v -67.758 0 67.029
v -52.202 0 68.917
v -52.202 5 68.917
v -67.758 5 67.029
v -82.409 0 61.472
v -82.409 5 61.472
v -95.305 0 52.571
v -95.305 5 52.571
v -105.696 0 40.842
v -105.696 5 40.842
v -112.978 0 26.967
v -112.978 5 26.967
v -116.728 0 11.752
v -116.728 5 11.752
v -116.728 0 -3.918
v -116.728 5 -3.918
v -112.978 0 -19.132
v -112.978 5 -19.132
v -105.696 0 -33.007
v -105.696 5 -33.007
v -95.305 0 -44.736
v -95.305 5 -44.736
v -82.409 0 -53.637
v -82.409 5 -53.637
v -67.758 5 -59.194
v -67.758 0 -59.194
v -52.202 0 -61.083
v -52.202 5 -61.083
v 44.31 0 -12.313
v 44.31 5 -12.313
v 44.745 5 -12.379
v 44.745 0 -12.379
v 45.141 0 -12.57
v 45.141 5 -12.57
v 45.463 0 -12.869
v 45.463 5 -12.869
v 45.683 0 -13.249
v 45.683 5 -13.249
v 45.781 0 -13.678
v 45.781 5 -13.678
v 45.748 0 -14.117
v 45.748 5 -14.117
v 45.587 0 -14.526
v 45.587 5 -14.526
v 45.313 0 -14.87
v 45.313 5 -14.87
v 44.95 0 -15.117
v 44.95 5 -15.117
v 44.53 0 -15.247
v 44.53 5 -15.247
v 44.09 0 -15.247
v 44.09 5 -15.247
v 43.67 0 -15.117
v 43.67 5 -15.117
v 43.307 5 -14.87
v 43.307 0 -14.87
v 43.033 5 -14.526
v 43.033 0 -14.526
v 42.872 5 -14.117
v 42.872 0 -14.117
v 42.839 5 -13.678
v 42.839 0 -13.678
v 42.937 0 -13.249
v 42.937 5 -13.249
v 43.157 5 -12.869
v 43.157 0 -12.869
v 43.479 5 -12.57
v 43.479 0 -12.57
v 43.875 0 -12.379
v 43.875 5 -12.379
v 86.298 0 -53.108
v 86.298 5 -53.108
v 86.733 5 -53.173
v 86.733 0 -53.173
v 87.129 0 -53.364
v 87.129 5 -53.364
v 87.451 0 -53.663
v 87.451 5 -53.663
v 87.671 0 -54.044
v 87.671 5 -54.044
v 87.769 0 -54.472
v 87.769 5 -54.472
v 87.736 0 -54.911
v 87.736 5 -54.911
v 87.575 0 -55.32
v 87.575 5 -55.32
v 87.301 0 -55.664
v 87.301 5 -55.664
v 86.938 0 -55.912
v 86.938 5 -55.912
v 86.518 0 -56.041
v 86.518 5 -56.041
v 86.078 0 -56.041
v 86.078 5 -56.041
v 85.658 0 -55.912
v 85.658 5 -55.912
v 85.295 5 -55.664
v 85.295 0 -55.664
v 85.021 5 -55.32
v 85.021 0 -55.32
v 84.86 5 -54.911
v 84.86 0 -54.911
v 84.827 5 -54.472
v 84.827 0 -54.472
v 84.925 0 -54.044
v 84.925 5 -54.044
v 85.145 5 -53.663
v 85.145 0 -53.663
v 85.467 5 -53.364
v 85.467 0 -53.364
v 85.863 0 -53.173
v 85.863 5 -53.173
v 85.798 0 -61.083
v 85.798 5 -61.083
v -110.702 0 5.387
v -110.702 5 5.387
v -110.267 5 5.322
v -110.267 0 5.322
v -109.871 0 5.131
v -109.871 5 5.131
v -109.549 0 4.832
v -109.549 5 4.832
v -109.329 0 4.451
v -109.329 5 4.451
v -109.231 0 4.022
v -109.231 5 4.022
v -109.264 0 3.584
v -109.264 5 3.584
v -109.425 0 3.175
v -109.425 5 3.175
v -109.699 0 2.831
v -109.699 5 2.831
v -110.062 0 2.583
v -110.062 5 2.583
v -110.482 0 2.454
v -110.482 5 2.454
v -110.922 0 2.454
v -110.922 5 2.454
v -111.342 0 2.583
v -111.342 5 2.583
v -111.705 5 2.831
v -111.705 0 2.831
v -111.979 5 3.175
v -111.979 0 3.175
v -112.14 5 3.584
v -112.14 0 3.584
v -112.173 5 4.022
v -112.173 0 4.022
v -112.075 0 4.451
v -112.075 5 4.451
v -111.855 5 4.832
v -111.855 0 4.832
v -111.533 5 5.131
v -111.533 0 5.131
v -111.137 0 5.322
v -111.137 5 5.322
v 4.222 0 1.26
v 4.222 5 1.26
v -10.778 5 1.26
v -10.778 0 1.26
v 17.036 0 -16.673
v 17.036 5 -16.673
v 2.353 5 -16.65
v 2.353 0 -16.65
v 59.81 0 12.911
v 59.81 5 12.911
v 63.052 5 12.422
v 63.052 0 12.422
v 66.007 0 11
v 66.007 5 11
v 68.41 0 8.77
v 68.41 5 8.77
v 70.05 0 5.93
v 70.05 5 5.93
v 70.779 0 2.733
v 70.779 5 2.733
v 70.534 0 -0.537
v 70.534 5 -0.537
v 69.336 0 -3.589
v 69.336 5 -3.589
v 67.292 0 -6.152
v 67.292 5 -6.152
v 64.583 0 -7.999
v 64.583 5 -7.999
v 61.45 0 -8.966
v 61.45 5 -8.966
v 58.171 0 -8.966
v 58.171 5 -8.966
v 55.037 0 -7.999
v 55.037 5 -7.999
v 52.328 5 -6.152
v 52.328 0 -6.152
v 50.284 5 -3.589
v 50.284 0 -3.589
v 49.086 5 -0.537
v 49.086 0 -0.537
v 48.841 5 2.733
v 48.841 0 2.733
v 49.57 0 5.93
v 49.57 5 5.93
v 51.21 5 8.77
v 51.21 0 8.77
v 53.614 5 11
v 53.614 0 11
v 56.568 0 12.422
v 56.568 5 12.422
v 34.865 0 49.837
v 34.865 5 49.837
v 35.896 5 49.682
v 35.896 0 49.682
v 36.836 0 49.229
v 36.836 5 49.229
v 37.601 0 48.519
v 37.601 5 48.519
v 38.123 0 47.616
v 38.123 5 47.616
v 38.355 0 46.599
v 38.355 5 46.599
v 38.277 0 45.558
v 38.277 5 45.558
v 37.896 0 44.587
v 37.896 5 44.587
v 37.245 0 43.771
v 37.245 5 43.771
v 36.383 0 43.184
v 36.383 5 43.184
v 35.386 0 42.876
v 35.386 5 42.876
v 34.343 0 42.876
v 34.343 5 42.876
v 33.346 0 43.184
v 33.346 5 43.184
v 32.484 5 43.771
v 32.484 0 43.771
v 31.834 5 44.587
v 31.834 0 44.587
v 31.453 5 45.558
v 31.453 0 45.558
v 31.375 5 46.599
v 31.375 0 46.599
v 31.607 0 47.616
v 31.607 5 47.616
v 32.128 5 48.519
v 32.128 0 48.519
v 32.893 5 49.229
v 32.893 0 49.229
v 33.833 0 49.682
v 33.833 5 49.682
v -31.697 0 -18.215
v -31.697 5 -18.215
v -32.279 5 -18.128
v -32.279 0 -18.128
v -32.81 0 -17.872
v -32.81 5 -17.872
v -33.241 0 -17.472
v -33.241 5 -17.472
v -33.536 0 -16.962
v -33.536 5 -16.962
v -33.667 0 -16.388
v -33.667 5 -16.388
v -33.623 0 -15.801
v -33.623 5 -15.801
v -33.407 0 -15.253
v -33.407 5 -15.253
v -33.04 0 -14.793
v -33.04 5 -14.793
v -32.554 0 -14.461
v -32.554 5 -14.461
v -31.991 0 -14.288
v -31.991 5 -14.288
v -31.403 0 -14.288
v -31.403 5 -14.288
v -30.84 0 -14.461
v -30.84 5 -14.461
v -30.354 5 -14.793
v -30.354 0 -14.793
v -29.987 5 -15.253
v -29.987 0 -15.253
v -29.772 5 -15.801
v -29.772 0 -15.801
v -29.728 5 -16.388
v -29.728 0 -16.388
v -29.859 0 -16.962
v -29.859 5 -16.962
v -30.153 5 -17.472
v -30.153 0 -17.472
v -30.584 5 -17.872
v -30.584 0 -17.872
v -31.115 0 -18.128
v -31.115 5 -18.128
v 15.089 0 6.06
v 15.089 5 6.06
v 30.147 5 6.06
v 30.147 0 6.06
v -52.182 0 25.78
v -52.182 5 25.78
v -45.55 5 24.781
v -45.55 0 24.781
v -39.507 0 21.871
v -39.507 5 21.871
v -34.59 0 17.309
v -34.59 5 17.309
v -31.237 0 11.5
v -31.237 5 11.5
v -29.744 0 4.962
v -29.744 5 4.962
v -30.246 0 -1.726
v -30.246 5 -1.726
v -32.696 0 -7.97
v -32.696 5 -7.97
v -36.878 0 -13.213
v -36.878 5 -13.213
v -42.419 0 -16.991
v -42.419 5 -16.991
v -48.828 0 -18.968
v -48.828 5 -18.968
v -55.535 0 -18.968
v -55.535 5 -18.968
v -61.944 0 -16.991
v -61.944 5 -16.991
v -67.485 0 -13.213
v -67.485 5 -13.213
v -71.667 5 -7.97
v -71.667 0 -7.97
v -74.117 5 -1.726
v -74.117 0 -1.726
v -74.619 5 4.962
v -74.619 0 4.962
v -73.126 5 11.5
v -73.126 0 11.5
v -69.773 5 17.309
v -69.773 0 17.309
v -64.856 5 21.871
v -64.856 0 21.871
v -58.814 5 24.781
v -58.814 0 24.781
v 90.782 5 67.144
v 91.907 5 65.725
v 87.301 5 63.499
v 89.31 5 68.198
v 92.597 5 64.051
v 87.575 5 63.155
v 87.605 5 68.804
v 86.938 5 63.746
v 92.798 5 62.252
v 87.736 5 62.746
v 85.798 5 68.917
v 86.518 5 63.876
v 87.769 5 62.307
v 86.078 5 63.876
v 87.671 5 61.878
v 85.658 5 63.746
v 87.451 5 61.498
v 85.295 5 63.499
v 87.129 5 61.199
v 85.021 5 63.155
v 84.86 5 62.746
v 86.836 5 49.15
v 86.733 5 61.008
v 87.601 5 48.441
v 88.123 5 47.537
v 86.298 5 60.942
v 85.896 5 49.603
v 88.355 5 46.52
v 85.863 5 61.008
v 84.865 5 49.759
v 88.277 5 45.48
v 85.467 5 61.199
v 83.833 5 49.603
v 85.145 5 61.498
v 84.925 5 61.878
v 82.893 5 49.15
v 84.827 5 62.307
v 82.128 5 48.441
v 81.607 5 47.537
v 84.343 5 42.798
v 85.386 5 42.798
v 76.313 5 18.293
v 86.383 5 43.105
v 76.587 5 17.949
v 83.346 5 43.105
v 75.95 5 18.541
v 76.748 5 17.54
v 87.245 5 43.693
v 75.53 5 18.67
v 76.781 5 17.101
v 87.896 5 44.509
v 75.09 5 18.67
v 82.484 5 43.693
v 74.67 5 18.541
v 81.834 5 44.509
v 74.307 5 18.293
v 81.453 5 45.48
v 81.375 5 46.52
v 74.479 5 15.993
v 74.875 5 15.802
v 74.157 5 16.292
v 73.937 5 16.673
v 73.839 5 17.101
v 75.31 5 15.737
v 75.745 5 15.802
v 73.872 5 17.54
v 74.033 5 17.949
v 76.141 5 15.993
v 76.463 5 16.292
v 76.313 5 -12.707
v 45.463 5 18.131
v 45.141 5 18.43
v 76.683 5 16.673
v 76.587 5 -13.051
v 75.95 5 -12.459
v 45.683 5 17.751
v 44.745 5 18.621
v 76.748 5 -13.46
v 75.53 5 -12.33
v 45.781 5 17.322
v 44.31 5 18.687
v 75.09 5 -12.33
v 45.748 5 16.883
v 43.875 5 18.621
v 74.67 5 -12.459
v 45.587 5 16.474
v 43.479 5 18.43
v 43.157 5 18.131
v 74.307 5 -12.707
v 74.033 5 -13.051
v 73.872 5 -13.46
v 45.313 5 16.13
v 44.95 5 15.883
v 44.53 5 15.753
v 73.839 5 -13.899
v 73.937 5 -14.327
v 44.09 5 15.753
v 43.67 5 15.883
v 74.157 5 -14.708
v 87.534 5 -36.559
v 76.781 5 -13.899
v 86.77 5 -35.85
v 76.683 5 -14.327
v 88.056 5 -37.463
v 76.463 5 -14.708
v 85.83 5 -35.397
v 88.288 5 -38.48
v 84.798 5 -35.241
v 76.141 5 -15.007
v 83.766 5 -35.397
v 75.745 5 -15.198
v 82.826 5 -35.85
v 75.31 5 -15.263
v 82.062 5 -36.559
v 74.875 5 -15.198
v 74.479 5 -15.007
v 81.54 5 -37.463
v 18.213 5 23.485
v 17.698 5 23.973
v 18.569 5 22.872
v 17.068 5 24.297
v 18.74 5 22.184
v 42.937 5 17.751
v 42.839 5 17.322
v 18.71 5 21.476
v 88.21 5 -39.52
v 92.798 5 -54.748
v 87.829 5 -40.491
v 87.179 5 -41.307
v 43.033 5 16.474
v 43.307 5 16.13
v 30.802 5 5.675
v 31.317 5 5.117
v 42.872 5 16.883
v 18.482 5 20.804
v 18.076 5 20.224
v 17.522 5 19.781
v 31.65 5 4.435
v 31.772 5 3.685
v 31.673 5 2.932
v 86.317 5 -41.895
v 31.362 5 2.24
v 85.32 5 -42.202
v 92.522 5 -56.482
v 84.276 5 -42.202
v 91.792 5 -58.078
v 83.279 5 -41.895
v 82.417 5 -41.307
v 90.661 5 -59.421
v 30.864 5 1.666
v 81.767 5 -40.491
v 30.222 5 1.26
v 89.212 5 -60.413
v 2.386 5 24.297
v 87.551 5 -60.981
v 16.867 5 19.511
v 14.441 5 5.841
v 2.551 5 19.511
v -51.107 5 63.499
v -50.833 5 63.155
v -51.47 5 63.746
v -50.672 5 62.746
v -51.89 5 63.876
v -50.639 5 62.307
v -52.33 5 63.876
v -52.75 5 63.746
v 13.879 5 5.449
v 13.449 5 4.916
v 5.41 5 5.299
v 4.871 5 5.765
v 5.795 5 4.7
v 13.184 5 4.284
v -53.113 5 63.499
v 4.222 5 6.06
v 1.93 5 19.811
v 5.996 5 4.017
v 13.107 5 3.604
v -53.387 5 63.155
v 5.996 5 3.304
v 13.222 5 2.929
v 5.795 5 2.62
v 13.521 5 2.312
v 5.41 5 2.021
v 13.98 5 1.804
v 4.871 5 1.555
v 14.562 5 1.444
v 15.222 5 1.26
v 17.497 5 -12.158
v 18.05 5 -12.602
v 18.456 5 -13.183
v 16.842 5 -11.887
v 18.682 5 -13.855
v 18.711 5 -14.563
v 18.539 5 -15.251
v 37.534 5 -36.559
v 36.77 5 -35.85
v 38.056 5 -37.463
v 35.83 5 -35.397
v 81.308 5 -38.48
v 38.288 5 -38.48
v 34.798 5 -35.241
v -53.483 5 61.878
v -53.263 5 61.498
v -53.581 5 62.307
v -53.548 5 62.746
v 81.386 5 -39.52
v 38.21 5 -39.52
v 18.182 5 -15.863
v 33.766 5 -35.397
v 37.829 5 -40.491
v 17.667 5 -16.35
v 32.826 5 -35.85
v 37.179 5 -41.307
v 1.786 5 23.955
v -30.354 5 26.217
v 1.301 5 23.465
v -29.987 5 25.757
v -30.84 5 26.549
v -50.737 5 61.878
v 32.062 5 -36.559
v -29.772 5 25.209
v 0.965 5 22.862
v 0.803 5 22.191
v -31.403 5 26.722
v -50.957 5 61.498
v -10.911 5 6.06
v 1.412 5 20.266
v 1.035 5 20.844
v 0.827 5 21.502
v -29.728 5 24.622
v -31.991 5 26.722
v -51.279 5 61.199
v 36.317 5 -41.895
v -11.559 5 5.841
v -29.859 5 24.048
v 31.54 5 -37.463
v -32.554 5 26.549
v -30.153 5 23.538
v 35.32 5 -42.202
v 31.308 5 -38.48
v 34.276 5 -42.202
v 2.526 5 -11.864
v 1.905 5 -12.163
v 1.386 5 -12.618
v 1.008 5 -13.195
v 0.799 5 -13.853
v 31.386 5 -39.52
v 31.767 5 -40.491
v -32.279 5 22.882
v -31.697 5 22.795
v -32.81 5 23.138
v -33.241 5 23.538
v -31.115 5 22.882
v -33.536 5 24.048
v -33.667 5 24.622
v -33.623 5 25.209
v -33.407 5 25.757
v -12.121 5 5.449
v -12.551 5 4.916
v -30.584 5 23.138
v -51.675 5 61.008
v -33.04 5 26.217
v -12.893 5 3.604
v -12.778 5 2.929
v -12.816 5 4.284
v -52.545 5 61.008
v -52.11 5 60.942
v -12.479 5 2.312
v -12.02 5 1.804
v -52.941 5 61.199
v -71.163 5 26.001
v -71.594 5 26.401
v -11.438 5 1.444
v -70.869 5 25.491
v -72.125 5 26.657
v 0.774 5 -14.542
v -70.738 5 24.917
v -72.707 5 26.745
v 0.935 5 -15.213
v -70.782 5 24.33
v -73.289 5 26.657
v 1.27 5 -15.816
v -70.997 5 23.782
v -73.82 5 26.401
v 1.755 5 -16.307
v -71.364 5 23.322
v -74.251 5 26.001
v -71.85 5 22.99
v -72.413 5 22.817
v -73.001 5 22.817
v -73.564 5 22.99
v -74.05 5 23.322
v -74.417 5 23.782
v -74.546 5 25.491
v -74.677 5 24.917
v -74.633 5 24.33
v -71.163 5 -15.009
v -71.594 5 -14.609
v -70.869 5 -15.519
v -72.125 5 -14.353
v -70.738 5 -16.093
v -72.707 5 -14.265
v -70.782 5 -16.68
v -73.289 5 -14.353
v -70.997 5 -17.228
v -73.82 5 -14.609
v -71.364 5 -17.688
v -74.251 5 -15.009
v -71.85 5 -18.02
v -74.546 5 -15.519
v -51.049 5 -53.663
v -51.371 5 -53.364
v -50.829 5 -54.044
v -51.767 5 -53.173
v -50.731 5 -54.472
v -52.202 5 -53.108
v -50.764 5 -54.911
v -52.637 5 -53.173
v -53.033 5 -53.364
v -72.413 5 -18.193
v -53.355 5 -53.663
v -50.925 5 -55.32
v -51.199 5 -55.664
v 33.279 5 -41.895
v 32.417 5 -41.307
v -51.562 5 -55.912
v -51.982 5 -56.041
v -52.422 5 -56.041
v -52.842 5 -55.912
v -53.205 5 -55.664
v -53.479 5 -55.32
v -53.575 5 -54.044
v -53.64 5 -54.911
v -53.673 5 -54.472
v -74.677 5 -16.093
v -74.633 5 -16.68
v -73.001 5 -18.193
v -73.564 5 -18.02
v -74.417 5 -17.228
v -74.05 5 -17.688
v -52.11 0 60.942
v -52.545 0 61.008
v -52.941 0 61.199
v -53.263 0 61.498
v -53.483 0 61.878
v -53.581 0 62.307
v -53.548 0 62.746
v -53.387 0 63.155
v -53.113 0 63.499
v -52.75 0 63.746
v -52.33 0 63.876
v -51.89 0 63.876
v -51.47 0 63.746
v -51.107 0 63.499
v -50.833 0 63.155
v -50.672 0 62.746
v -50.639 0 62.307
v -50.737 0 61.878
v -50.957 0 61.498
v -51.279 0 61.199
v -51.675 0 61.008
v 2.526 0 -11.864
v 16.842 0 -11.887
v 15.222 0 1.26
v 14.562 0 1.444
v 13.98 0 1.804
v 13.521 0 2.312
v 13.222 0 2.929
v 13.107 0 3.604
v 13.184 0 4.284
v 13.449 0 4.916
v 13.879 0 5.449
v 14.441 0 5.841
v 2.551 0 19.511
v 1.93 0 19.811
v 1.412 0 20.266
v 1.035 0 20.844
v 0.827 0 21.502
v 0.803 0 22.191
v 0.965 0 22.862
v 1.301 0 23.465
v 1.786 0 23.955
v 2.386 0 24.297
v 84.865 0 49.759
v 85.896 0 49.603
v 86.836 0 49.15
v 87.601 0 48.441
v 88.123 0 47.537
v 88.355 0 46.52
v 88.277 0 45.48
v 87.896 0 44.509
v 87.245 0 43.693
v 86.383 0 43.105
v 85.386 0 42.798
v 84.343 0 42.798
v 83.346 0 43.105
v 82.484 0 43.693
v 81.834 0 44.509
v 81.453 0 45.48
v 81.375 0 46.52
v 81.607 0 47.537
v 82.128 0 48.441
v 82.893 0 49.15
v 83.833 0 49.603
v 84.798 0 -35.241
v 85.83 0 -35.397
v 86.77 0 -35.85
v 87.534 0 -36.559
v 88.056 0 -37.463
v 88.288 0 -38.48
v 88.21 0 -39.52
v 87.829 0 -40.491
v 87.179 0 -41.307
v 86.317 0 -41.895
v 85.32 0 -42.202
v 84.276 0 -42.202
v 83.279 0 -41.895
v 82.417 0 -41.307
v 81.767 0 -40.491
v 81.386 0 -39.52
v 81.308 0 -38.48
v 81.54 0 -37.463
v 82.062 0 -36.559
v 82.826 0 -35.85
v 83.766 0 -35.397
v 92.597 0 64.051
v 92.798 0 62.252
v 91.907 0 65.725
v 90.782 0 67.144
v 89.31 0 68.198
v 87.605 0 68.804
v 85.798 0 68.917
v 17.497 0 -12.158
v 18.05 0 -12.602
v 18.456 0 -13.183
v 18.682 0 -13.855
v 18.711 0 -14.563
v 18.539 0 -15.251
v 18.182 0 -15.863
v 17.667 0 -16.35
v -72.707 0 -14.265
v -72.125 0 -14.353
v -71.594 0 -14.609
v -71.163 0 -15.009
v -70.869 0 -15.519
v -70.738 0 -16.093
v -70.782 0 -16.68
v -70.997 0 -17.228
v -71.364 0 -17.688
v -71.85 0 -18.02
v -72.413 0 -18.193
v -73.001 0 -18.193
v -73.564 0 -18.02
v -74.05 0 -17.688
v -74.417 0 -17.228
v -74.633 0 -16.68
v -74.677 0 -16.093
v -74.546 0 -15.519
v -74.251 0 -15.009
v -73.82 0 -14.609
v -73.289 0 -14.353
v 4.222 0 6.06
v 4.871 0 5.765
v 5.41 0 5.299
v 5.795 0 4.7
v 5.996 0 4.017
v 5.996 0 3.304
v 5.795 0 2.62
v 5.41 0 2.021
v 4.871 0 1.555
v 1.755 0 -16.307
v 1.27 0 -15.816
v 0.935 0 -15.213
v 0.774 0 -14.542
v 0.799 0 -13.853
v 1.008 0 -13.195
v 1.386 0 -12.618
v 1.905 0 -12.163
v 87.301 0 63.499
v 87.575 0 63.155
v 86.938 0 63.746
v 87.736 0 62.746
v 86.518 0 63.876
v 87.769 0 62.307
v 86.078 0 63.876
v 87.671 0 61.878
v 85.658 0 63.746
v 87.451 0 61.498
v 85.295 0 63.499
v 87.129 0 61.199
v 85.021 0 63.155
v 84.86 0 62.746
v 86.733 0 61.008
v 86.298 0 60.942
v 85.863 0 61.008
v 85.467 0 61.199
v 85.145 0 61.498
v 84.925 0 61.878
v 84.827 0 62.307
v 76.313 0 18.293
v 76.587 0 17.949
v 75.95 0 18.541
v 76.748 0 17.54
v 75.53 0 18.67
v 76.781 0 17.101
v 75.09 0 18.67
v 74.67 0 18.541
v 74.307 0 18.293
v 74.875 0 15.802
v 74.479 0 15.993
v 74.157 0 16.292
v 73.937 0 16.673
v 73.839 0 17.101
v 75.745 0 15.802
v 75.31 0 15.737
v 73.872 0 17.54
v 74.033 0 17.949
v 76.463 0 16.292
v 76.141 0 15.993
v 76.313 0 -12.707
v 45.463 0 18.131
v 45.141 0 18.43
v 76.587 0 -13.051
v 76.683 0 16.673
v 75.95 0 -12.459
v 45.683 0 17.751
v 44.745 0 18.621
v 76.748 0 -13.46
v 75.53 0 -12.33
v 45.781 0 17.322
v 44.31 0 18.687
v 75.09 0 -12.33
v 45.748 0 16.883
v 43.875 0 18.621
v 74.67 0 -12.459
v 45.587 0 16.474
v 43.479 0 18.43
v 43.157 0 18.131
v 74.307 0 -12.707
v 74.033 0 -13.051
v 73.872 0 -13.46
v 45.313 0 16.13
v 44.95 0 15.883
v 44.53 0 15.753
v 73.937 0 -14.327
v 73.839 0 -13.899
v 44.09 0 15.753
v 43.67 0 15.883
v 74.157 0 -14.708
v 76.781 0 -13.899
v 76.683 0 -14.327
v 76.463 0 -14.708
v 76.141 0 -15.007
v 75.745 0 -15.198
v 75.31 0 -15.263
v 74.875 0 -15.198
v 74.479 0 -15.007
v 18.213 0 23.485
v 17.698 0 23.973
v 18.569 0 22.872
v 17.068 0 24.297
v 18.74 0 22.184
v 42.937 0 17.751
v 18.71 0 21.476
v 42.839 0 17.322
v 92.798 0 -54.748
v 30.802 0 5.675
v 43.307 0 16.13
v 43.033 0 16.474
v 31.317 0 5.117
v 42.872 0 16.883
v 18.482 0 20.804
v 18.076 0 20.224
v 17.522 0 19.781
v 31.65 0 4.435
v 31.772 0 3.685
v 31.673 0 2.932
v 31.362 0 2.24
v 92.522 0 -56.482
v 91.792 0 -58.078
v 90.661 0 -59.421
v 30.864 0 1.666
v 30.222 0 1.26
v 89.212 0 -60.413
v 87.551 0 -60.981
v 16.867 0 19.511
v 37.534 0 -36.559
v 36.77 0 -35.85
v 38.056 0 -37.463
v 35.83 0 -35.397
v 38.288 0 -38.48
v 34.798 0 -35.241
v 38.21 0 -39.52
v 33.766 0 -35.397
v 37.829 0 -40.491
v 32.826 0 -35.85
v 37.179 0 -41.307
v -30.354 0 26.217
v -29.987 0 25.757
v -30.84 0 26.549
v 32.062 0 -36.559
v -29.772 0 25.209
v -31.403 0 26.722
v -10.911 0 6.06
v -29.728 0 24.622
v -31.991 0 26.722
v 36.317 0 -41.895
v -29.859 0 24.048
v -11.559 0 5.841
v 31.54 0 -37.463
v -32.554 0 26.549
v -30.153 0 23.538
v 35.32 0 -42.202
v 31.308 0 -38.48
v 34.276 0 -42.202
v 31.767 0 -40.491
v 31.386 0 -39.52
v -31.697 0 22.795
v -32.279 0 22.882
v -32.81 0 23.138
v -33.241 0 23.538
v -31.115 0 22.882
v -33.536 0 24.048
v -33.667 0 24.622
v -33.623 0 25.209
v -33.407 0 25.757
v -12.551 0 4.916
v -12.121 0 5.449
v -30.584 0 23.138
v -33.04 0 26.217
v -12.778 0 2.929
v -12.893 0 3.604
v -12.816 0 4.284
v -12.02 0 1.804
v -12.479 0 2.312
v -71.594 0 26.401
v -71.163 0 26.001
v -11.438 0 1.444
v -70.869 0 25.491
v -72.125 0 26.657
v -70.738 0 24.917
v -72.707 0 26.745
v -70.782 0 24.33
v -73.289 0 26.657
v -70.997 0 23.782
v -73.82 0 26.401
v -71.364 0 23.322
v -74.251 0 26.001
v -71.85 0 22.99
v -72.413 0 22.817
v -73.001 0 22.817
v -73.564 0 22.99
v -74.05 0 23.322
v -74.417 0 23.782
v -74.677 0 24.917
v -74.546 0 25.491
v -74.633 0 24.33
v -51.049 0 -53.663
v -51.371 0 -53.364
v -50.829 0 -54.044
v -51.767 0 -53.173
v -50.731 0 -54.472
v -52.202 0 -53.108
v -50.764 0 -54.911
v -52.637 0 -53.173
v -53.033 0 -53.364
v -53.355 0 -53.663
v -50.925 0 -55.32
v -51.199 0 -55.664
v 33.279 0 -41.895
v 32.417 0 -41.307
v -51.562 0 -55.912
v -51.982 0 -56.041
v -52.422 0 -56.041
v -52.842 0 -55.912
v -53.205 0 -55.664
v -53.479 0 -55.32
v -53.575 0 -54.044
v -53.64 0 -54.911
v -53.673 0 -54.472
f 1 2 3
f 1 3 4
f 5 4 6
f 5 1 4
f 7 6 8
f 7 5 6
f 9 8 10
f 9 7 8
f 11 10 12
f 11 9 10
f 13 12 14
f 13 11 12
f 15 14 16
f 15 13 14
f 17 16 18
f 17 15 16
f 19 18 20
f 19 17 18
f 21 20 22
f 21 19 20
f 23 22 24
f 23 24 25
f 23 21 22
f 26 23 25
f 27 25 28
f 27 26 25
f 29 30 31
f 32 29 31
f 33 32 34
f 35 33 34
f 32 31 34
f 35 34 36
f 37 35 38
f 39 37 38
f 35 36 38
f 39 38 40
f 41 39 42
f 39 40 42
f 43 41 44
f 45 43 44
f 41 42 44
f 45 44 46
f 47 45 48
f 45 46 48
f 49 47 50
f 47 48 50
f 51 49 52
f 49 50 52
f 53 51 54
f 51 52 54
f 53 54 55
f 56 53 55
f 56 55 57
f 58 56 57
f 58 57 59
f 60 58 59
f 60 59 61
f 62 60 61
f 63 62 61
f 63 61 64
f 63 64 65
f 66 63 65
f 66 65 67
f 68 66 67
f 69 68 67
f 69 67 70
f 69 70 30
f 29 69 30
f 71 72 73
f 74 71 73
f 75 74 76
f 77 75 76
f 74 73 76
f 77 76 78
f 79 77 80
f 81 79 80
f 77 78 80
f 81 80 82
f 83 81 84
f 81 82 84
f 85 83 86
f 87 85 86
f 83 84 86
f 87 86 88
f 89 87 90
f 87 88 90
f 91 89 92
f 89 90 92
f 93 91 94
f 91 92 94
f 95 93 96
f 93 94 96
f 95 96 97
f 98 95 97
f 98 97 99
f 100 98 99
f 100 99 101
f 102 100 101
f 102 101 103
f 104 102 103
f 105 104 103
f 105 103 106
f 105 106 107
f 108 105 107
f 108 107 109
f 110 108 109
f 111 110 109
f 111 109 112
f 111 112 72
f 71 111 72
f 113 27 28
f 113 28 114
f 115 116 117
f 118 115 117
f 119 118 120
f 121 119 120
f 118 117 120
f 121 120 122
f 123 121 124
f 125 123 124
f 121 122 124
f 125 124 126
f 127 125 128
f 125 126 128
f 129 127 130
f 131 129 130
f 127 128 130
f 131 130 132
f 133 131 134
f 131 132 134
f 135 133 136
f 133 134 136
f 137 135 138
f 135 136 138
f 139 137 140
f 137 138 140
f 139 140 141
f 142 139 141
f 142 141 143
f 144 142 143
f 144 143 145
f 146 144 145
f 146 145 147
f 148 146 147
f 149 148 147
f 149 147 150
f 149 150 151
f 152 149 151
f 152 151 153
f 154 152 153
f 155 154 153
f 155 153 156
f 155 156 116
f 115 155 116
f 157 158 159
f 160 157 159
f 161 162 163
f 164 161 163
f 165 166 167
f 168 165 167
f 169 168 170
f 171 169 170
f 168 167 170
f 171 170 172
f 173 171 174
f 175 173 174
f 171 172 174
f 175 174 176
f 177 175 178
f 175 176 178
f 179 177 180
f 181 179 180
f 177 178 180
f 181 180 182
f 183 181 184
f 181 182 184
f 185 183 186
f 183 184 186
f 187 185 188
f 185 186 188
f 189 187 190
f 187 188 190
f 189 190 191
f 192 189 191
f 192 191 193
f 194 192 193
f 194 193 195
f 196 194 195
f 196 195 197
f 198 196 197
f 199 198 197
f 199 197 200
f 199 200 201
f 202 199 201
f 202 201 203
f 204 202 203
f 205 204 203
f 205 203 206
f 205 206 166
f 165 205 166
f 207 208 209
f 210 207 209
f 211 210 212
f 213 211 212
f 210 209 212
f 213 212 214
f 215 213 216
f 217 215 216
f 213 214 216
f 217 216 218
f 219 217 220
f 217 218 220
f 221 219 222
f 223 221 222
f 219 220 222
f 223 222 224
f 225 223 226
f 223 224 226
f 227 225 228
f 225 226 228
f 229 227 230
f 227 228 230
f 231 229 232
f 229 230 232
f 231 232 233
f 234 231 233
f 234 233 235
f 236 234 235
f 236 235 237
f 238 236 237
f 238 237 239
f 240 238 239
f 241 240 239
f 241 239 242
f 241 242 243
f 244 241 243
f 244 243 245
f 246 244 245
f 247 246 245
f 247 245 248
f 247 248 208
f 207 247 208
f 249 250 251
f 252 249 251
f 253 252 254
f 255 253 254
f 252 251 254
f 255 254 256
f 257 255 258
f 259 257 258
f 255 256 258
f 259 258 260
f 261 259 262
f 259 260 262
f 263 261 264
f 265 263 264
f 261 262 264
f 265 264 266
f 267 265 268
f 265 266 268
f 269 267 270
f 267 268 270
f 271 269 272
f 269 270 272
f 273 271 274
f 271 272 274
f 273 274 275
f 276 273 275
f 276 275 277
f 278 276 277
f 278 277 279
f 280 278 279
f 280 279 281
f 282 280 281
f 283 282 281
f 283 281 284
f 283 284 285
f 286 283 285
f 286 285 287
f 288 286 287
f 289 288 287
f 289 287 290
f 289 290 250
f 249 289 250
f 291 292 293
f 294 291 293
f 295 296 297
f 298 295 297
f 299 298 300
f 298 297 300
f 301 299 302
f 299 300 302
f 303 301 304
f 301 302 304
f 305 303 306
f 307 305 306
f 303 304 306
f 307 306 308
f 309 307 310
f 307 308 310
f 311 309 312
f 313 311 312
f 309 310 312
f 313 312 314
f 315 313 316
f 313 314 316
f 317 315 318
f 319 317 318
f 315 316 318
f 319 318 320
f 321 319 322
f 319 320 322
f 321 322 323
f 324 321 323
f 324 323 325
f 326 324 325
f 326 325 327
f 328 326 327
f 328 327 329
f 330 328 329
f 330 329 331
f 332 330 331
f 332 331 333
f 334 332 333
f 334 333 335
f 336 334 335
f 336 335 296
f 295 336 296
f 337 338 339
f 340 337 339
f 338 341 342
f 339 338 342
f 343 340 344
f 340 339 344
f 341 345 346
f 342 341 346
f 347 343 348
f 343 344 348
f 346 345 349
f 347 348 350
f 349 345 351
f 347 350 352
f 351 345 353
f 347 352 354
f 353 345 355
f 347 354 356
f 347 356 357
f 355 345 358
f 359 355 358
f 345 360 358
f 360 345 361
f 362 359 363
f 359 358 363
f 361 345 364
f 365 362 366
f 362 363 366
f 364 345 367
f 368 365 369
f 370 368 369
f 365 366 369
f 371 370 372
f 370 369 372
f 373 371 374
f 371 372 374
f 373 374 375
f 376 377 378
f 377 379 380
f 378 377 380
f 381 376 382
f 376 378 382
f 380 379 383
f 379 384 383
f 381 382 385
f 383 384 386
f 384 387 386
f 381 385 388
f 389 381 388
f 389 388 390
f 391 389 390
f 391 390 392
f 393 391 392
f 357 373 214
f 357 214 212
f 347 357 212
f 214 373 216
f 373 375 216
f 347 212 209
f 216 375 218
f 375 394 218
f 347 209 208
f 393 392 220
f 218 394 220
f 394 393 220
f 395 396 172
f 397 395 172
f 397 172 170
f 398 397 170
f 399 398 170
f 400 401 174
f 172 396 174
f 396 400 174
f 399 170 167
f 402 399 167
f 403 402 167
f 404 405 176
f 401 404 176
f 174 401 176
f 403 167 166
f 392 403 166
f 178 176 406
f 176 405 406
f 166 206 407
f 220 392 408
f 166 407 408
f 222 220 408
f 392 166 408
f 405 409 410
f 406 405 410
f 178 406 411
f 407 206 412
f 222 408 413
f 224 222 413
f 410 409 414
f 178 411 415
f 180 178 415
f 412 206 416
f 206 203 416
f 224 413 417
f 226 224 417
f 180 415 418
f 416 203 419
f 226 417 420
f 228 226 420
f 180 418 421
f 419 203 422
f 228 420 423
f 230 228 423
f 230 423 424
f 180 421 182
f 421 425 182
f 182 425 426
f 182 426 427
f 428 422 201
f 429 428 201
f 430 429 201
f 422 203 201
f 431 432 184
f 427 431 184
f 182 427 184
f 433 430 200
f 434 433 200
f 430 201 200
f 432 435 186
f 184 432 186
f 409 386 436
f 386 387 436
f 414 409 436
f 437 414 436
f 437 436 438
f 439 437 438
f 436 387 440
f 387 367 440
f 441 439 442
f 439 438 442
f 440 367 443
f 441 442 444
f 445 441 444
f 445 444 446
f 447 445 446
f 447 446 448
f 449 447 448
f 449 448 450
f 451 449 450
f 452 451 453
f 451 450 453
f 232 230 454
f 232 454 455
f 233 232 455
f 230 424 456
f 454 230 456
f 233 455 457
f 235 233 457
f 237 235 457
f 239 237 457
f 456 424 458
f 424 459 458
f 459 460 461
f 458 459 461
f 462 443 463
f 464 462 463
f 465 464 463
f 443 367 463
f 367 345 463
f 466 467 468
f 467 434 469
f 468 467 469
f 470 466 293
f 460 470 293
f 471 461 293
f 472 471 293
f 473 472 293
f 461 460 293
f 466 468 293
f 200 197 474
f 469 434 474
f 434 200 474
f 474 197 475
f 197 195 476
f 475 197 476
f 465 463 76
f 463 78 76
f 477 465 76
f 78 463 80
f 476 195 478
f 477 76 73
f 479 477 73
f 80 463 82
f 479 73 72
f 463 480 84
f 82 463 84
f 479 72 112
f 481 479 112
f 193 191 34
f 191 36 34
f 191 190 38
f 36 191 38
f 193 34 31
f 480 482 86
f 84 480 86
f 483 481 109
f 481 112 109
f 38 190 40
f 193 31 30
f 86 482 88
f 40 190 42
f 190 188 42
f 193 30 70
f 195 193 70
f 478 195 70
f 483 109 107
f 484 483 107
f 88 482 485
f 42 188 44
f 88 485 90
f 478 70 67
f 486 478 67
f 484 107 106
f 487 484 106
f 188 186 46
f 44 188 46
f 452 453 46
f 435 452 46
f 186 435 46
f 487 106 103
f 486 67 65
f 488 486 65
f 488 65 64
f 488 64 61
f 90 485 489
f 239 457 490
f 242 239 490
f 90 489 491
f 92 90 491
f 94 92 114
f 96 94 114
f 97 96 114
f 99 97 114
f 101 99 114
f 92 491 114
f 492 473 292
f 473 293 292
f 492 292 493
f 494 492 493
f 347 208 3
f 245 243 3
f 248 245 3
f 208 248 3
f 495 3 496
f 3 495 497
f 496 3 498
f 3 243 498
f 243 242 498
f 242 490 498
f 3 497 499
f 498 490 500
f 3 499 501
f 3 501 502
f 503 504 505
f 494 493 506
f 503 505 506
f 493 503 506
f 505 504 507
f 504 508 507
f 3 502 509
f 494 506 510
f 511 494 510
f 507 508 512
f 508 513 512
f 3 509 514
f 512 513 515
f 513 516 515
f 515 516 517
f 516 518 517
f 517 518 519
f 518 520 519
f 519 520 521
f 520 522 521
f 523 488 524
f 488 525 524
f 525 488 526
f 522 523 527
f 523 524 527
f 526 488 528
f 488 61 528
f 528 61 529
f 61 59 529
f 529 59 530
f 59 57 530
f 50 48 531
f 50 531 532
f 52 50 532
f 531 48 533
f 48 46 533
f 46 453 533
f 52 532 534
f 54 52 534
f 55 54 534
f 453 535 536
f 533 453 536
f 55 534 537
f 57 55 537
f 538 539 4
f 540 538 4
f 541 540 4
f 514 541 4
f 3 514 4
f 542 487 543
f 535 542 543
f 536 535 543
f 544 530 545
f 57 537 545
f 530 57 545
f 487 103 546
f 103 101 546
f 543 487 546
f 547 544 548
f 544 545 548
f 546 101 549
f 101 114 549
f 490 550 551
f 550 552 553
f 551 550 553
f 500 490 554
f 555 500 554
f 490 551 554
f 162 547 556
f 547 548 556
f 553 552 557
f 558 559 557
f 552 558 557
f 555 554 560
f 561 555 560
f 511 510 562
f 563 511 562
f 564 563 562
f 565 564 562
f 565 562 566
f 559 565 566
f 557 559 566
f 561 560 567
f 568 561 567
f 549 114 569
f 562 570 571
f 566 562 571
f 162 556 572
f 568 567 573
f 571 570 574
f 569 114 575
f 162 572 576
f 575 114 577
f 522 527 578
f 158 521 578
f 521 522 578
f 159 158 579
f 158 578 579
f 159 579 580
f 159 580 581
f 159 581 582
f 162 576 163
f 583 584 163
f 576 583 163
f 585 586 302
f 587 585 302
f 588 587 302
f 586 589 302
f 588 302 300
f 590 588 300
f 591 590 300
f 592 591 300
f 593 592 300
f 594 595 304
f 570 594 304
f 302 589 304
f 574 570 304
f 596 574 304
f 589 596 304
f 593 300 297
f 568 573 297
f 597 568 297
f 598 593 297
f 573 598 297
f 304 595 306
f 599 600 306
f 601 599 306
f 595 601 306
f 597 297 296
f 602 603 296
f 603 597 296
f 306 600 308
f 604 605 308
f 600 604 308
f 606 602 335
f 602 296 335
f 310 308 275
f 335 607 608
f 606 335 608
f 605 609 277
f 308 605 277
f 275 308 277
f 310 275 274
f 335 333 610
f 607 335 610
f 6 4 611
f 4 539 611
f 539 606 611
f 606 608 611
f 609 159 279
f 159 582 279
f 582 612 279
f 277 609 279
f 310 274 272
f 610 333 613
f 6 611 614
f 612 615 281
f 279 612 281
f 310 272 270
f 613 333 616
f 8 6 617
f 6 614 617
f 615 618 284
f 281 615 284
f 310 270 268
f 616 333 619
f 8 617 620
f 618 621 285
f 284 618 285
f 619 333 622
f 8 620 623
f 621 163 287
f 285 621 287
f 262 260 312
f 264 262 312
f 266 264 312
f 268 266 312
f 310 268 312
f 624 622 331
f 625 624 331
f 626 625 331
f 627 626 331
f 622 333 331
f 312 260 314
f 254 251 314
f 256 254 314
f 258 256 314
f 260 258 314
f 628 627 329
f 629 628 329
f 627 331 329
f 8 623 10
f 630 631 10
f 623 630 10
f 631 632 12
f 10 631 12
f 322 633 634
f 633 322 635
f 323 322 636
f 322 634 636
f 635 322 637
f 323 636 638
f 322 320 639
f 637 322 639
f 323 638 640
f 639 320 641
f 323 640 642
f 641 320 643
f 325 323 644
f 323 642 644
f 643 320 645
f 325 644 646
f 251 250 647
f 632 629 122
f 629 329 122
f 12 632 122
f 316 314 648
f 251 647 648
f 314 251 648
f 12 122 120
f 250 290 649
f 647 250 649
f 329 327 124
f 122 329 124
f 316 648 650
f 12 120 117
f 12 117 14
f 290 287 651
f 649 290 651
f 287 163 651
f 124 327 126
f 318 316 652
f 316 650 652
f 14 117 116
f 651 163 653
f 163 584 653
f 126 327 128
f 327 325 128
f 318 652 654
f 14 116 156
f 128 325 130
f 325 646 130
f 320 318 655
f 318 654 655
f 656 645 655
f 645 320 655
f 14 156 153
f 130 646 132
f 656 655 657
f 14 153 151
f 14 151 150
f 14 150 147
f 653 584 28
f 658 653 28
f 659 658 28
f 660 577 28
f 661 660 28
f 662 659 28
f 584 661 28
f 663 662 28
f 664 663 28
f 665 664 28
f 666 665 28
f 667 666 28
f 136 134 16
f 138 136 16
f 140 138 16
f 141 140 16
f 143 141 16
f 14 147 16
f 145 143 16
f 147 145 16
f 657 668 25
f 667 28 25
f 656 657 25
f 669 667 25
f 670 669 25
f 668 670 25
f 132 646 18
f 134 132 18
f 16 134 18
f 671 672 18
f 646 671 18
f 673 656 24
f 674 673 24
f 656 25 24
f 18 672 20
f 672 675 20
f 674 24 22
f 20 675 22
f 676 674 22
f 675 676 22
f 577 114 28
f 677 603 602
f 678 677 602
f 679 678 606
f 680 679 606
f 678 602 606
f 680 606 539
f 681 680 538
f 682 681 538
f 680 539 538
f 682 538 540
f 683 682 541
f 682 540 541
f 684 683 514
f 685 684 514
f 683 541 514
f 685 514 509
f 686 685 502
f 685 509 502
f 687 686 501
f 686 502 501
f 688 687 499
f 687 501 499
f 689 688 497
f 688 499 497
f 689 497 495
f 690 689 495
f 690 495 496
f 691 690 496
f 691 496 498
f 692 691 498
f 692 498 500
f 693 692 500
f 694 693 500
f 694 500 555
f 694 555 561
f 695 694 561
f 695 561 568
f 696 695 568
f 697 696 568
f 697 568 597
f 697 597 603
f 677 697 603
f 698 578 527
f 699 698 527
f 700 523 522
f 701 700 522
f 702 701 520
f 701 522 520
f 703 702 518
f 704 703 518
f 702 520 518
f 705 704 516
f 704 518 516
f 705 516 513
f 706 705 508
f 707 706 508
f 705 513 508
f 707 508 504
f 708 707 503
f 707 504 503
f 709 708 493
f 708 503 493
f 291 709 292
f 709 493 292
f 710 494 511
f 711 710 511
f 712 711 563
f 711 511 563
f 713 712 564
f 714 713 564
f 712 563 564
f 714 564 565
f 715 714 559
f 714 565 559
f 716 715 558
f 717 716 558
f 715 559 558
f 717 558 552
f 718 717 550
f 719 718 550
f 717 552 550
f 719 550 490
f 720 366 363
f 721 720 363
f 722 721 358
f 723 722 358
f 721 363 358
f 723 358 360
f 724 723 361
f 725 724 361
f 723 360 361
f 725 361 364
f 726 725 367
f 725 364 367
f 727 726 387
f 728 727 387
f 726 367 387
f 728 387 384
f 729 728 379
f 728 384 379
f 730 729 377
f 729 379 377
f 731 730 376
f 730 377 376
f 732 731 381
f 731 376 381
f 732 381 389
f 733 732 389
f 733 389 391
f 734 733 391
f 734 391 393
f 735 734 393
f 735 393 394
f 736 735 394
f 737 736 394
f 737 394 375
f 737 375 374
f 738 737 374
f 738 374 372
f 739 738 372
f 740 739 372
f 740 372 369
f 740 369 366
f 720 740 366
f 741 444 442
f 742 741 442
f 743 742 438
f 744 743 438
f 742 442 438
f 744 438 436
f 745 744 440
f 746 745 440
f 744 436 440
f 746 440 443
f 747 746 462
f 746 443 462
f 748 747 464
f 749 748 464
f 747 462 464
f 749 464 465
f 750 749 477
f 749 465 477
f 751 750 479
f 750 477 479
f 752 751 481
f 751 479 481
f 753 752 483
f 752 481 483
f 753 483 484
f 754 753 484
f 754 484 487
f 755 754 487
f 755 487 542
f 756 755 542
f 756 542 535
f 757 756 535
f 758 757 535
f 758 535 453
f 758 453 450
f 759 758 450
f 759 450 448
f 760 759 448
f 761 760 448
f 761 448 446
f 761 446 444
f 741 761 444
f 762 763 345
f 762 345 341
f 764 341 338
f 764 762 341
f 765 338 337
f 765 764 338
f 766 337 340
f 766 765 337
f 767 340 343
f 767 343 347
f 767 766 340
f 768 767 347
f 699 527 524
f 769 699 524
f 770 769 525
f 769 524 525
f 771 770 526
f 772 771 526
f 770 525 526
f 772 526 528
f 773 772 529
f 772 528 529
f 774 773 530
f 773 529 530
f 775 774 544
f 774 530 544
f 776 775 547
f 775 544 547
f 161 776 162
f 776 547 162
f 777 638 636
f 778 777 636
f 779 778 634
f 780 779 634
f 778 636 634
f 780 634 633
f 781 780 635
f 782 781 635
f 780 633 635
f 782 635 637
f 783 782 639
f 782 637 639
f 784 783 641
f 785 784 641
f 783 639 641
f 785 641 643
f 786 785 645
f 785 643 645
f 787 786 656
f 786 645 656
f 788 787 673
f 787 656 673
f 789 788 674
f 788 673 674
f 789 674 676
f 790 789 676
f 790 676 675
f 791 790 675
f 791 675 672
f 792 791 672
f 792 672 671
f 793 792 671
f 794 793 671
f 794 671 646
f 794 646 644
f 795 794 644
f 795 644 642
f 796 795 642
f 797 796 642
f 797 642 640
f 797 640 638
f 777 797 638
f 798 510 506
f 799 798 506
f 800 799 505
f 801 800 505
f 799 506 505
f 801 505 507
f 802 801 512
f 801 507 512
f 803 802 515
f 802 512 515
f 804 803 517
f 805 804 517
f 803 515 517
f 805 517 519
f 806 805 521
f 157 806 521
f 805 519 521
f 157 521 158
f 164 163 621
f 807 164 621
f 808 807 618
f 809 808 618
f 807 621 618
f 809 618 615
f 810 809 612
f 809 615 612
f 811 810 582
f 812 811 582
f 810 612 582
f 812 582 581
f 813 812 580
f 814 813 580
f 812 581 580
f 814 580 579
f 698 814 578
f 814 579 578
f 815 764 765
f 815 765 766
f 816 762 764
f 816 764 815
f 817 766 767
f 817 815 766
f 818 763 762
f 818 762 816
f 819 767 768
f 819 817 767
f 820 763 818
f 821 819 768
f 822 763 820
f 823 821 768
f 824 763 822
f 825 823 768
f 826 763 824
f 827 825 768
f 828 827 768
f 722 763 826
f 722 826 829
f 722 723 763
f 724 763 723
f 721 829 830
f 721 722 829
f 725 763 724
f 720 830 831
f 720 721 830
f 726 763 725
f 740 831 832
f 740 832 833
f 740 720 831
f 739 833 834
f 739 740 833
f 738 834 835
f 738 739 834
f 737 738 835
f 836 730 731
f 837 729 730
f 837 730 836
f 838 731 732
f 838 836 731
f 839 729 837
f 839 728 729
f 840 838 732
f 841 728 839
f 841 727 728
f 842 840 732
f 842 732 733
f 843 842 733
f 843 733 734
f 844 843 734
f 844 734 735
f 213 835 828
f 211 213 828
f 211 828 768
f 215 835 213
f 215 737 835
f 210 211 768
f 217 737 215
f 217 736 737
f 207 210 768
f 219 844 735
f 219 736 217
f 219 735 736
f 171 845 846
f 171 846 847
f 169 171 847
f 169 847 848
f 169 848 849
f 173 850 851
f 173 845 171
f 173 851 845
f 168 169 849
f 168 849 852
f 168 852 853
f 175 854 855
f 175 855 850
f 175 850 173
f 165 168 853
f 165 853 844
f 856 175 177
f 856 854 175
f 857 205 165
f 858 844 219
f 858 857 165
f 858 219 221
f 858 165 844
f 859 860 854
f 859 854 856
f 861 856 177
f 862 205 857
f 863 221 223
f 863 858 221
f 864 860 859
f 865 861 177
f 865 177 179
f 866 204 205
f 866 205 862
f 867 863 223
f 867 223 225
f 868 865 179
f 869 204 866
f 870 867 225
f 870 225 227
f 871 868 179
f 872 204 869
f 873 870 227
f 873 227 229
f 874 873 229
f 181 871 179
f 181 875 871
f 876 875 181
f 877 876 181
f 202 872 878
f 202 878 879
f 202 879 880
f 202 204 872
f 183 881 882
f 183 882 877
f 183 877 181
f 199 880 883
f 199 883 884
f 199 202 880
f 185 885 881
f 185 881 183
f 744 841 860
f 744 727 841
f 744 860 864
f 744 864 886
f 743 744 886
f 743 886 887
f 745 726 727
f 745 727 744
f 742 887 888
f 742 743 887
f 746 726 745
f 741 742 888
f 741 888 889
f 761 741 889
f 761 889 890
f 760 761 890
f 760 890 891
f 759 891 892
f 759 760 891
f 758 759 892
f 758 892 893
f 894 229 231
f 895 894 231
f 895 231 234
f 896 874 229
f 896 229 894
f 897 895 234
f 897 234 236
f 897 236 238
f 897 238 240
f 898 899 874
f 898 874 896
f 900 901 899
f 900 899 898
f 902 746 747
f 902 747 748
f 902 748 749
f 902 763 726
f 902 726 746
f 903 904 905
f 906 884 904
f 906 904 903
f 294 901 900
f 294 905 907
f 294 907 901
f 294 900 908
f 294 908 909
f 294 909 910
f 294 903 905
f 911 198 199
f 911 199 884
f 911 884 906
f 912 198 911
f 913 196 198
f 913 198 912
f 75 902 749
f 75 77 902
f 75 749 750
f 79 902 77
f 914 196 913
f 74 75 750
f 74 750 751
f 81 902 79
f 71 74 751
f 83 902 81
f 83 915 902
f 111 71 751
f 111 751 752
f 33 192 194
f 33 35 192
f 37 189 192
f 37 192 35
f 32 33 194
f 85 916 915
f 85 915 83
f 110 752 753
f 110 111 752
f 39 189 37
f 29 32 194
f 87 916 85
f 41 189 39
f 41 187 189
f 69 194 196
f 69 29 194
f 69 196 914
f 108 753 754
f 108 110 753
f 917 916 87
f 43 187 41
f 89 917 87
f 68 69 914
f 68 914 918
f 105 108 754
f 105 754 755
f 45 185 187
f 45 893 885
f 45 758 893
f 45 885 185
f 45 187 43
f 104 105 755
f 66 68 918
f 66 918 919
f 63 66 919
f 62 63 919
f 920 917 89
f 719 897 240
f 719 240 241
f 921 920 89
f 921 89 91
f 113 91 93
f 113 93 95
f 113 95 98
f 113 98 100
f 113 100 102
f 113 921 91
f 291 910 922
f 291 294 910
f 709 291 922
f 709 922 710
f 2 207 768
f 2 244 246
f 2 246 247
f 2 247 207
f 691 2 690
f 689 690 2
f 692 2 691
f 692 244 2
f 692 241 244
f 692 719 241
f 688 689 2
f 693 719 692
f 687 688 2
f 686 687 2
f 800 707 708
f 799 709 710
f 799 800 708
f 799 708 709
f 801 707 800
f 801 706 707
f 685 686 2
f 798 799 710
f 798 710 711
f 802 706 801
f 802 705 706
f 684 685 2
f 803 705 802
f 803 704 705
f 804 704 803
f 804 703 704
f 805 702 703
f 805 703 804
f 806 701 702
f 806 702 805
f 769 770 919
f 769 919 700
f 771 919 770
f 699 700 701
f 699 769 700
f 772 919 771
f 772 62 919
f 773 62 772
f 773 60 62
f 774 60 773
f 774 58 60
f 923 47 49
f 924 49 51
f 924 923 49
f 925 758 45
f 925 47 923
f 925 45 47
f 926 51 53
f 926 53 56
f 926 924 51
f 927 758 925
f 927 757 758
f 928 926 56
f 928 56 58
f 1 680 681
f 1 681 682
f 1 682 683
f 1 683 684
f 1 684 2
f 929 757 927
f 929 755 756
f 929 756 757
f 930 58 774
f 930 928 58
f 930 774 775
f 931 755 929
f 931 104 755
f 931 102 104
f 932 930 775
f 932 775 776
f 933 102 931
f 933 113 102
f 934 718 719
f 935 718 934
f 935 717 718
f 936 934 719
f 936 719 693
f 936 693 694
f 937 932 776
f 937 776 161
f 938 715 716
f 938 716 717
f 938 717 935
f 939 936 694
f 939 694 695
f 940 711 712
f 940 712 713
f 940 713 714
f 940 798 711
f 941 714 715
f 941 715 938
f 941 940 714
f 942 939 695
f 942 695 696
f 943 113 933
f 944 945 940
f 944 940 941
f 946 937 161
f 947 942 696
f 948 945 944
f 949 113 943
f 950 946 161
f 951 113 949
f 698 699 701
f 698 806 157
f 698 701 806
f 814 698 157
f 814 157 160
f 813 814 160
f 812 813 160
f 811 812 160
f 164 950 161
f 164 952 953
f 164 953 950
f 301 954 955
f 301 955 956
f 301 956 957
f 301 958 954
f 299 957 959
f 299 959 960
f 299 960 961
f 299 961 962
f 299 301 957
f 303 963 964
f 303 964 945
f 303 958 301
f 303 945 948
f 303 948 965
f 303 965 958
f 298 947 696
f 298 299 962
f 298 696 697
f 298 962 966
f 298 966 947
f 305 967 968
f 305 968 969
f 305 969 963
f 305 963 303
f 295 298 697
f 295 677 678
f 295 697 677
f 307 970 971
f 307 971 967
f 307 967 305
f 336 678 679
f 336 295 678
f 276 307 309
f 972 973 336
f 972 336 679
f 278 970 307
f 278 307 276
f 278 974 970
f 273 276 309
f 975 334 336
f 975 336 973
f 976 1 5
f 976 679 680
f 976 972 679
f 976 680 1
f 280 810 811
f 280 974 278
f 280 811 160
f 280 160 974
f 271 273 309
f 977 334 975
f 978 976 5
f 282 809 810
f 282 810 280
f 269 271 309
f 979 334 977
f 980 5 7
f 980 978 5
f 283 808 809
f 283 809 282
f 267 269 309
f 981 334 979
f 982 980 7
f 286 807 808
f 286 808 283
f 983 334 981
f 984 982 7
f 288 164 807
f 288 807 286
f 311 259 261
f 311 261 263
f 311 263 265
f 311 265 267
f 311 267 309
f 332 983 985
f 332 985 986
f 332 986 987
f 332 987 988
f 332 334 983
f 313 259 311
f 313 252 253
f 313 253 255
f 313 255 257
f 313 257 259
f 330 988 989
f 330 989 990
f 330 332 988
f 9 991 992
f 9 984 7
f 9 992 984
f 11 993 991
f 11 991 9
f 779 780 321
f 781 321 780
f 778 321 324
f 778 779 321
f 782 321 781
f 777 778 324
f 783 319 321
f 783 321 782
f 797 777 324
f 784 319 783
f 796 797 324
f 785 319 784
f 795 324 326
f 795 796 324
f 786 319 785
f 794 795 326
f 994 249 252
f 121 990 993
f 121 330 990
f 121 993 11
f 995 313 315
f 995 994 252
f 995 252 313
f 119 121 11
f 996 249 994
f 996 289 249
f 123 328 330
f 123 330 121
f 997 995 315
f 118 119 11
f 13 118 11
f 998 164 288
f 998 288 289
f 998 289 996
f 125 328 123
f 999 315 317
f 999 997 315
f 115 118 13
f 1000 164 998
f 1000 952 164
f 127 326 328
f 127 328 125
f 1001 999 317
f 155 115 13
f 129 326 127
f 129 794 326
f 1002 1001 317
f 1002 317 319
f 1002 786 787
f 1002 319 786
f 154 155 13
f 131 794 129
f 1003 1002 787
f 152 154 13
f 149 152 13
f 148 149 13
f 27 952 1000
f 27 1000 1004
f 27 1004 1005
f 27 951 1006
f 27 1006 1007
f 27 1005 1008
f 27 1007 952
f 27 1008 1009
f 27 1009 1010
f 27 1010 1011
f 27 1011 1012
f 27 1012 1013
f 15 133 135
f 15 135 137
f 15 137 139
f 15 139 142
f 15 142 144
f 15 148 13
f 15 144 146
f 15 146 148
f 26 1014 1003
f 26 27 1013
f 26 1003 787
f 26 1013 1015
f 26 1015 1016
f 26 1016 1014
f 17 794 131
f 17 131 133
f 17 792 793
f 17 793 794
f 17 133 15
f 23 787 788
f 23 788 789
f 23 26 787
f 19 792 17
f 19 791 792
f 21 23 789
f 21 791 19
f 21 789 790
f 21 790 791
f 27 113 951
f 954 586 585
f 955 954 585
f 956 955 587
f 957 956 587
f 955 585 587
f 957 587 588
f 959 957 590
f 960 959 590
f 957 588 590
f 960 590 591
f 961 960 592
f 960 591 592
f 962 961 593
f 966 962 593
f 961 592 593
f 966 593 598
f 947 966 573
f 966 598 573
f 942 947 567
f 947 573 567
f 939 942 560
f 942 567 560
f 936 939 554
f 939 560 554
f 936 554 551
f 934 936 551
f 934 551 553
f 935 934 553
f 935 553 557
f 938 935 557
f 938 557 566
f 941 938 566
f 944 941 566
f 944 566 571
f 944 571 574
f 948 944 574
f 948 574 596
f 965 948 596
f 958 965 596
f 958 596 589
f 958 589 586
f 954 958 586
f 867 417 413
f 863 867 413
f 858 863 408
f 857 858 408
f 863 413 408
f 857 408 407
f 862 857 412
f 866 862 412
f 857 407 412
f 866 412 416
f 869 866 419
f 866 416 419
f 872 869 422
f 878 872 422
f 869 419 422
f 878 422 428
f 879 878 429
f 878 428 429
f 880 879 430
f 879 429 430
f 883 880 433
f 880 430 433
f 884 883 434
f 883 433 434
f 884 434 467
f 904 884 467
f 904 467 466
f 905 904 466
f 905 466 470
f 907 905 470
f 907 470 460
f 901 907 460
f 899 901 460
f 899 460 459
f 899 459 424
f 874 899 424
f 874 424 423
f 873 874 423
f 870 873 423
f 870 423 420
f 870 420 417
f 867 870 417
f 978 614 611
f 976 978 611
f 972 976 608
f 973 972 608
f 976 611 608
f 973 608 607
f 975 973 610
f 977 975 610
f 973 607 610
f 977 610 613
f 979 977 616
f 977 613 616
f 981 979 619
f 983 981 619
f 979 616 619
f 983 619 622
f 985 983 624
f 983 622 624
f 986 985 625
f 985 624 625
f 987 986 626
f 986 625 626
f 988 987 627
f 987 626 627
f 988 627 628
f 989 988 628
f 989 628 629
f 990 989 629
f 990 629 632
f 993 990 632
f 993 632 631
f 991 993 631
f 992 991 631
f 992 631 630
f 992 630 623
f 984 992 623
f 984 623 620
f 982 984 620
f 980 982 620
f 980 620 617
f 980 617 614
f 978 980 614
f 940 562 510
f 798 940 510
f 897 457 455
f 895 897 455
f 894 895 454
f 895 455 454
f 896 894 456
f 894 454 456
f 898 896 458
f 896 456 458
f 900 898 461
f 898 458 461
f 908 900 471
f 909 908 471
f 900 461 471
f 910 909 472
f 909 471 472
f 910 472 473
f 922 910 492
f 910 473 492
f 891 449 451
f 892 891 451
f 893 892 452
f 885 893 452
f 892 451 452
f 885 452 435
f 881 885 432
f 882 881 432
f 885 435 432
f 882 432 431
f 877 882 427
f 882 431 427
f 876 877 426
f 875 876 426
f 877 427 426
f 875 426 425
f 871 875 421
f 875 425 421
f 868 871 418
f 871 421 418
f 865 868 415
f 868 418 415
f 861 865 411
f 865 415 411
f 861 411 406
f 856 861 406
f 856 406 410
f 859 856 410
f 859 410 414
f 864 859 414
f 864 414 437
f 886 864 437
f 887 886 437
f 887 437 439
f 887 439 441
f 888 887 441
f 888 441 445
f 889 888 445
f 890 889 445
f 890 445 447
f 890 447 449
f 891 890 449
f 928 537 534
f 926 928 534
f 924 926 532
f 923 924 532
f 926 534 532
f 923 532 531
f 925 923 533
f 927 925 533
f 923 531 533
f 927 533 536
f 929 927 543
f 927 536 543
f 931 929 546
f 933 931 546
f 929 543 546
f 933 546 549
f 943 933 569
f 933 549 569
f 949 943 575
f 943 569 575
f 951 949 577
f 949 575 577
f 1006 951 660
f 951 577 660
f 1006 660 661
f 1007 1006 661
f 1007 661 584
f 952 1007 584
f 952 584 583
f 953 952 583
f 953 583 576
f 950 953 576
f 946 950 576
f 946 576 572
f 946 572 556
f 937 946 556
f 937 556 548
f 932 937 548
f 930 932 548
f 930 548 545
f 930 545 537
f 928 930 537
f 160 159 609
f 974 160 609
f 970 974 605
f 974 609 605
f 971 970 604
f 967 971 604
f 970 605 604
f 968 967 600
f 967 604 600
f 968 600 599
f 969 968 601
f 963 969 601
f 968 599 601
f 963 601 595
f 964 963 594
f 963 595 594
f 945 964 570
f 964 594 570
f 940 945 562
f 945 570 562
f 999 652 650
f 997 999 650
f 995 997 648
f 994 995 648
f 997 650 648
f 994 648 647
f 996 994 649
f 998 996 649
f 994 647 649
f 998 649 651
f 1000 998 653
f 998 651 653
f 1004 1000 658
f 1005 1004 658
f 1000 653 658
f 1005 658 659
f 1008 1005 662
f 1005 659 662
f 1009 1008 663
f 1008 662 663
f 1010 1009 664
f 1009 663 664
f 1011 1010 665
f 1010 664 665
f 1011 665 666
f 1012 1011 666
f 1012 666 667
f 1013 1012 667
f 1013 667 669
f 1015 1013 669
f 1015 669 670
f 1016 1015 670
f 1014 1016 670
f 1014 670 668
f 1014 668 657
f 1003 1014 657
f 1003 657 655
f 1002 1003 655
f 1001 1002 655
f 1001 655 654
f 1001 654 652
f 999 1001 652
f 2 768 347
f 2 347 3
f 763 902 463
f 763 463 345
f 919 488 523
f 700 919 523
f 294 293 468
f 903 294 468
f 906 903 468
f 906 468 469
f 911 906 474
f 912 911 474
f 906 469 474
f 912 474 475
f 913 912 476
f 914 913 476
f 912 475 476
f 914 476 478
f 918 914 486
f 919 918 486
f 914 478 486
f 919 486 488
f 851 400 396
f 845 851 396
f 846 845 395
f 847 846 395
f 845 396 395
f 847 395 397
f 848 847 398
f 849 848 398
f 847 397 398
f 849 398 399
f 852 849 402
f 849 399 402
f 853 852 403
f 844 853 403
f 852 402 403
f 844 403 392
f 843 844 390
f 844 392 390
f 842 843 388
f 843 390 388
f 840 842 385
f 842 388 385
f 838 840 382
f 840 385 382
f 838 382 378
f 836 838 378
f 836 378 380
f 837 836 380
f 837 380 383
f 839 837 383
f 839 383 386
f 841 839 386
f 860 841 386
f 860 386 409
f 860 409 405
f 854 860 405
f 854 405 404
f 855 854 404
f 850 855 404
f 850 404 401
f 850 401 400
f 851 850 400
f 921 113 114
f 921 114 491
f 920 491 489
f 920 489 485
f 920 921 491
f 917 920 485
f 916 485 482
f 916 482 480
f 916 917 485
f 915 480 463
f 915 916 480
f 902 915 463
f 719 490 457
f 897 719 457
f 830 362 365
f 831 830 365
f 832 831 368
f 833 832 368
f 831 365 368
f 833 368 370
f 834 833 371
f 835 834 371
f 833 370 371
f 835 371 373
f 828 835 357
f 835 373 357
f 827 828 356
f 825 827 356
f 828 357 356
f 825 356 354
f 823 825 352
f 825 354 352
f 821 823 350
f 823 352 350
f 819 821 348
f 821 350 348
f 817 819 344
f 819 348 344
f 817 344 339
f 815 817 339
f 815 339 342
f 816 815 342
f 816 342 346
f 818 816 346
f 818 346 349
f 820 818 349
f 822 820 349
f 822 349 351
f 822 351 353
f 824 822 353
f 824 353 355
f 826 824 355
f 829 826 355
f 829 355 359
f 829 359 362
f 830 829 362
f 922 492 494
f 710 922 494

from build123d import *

# Parameters (mm, degrees)
BOSS_EXTRUDE1_DEPTH = 5
SKETCH3_R           = 1.475
CUT_EXTRUDE1_DEPTH  = 137.064643721
SKETCH4_R           = 22.5
SKETCH4_R_2         = 11
SKETCH4_R_3         = 1.975
SKETCH4_R_4         = 1.475
SKETCH4_R_5         = 3.5
CUT_EXTRUDE2_DEPTH  = 137.064643721


with BuildPart() as part:
    # Sketch2 → Boss-Extrude1 (new body)
    with BuildSketch(Plane(origin=(0, 0, 0), x_dir=(1, 0, 0), z_dir=(0, 1, 0))):
        with BuildLine():
            Line((-52.202038886, 61.082677165), (85.797961114, 61.082677165))
            ThreePointArc((85.797961114, 61.082677165), (90.6611457, 59.421487905), (92.797961114, 54.747717054))
            Line((92.797961114, 54.747717054), (92.797961114, -62.252282946))
            ThreePointArc((92.797961114, -62.252282946), (90.782438223, -67.143884297), (85.797961114, -68.917322835))
            Line((85.797961114, -68.917322835), (-52.202038886, -68.917322835))
            ThreePointArc((-52.202038886, -68.917322835), (-117.202038886, -3.917322835), (-52.202038886, 61.082677165))
        make_face()
    extrude(amount=BOSS_EXTRUDE1_DEPTH)

    # Sketch3 → Cut-Extrude1 (cut, through all)
    with BuildSketch(Plane(origin=(0, 5, 0), x_dir=(1, 0, 0), z_dir=(0, 1, 0))):
        with Locations(Location((86.297961114, 54.582677165, 0), (0, 0, 270))):
            Circle(SKETCH3_R)
        with Locations(Location((-52.202038886, 54.582677165, 0), (0, 0, 270))):
            Circle(SKETCH3_R)
        with Locations(Location((-110.702038886, -3.912214457, 0), (0, 0, 270))):
            Circle(SKETCH3_R)
        with Locations(Location((86.297961114, -62.417322835, 0), (0, 0, 90))):
            Circle(SKETCH3_R)
        with Locations(Location((-52.11000774, -62.417322835, 0), (0, 0, 90))):
            Circle(SKETCH3_R)
    extrude(amount=-CUT_EXTRUDE1_DEPTH, mode=Mode.SUBTRACT)

    # Sketch4 → Cut-Extrude2 (cut, through all)
    with BuildSketch(Plane(origin=(0, 5, 0), x_dir=(1, 0, 0), z_dir=(0, 1, 0))):
        with BuildLine():
            Line((17.035736777, 16.673447137), (2.353343762, 16.650369213))
            ThreePointArc((2.353343762, 16.650369213), (0.763165117, 14.196667771), (2.526429623, 11.864240457))
            Line((2.526429623, 11.864240457), (16.842011582, 11.886741824))
            ThreePointArc((16.842011582, 11.886741824), (18.721537255, 14.207947413), (17.035736777, 16.673447137))
        make_face()
        with BuildLine():
            Line((4.221952, -1.260399725), (-10.778048, -1.260399725))
            ThreePointArc((-10.778048, -1.260399725), (-12.893391284, -3.603735064), (-10.910792873, -6.060399725))
            Line((-10.910792873, -6.060399725), (4.221952, -6.060399725))
            ThreePointArc((4.221952, -6.060399725), (6.021952, -3.660399725), (4.221952, -1.260399725))
        make_face()
        with BuildLine():
            Line((30.221952, -1.260399725), (15.221952, -1.260399725))
            ThreePointArc((15.221952, -1.260399725), (13.106608716, -3.603735064), (15.089207127, -6.060399725))
            Line((15.089207127, -6.060399725), (30.147453765, -6.060399725))
            ThreePointArc((30.147453765, -6.060399725), (31.77239266, -3.68504141), (30.221952, -1.260399725))
        make_face()
        with BuildLine():
            Line((16.866686946, -19.510676527), (2.551087303, -19.510676527))
            ThreePointArc((2.551087303, -19.510676527), (0.791491102, -21.845872472), (2.385524529, -24.297071429))
            Line((2.385524529, -24.297071429), (17.06793568, -24.297071429))
            ThreePointArc((17.06793568, -24.297071429), (18.749858786, -21.828924997), (16.866686946, -19.510676527))
        make_face()
        with Locations(Location((-52.181545547, -3.280325568, 0), (0, 0, 270))):
            Circle(SKETCH4_R)
        with Locations(Location((59.810085593, -1.911181789, 0), (0, 0, 270))):
            Circle(SKETCH4_R_2)
        with Locations(Location((-72.707038886, 16.240452632, 0), (0, 0, 270))):
            Circle(SKETCH4_R_3)
        with Locations(Location((-72.707038886, -24.769547368, 0), (0, 0, 270))):
            Circle(SKETCH4_R_3)
        with Locations(Location((-31.697038886, -24.769547368, 0), (0, 0, 90))):
            Circle(SKETCH4_R_3)
        with Locations(Location((-31.697038886, 16.240452632, 0), (0, 0, 90))):
            Circle(SKETCH4_R_3)
        with Locations(Location((44.310085593, 13.788312606, 0), (0, 0, 270))):
            Circle(SKETCH4_R_4)
        with Locations(Location((44.310085593, -17.211687394, 0), (0, 0, 270))):
            Circle(SKETCH4_R_4)
        with Locations(Location((75.310085593, -17.211687394, 0), (0, 0, 90))):
            Circle(SKETCH4_R_4)
        with Locations(Location((75.310085593, 13.788312606, 0), (0, 0, 90))):
            Circle(SKETCH4_R_4)
        with Locations(Location((84.797961114, 38.74145607, 0), (0, 0, 270))):
            Circle(SKETCH4_R_5)
        with Locations(Location((34.797961114, 38.74145607, 0), (0, 0, 270))):
            Circle(SKETCH4_R_5)
        with Locations(Location((84.864762974, -46.25854393, 0), (0, 0, 270))):
            Circle(SKETCH4_R_5)
        with Locations(Location((34.864824738, -46.337134304, 0), (0, 0, 270))):
            Circle(SKETCH4_R_5)
    extrude(amount=-CUT_EXTRUDE2_DEPTH, mode=Mode.SUBTRACT)


solid = part.part
